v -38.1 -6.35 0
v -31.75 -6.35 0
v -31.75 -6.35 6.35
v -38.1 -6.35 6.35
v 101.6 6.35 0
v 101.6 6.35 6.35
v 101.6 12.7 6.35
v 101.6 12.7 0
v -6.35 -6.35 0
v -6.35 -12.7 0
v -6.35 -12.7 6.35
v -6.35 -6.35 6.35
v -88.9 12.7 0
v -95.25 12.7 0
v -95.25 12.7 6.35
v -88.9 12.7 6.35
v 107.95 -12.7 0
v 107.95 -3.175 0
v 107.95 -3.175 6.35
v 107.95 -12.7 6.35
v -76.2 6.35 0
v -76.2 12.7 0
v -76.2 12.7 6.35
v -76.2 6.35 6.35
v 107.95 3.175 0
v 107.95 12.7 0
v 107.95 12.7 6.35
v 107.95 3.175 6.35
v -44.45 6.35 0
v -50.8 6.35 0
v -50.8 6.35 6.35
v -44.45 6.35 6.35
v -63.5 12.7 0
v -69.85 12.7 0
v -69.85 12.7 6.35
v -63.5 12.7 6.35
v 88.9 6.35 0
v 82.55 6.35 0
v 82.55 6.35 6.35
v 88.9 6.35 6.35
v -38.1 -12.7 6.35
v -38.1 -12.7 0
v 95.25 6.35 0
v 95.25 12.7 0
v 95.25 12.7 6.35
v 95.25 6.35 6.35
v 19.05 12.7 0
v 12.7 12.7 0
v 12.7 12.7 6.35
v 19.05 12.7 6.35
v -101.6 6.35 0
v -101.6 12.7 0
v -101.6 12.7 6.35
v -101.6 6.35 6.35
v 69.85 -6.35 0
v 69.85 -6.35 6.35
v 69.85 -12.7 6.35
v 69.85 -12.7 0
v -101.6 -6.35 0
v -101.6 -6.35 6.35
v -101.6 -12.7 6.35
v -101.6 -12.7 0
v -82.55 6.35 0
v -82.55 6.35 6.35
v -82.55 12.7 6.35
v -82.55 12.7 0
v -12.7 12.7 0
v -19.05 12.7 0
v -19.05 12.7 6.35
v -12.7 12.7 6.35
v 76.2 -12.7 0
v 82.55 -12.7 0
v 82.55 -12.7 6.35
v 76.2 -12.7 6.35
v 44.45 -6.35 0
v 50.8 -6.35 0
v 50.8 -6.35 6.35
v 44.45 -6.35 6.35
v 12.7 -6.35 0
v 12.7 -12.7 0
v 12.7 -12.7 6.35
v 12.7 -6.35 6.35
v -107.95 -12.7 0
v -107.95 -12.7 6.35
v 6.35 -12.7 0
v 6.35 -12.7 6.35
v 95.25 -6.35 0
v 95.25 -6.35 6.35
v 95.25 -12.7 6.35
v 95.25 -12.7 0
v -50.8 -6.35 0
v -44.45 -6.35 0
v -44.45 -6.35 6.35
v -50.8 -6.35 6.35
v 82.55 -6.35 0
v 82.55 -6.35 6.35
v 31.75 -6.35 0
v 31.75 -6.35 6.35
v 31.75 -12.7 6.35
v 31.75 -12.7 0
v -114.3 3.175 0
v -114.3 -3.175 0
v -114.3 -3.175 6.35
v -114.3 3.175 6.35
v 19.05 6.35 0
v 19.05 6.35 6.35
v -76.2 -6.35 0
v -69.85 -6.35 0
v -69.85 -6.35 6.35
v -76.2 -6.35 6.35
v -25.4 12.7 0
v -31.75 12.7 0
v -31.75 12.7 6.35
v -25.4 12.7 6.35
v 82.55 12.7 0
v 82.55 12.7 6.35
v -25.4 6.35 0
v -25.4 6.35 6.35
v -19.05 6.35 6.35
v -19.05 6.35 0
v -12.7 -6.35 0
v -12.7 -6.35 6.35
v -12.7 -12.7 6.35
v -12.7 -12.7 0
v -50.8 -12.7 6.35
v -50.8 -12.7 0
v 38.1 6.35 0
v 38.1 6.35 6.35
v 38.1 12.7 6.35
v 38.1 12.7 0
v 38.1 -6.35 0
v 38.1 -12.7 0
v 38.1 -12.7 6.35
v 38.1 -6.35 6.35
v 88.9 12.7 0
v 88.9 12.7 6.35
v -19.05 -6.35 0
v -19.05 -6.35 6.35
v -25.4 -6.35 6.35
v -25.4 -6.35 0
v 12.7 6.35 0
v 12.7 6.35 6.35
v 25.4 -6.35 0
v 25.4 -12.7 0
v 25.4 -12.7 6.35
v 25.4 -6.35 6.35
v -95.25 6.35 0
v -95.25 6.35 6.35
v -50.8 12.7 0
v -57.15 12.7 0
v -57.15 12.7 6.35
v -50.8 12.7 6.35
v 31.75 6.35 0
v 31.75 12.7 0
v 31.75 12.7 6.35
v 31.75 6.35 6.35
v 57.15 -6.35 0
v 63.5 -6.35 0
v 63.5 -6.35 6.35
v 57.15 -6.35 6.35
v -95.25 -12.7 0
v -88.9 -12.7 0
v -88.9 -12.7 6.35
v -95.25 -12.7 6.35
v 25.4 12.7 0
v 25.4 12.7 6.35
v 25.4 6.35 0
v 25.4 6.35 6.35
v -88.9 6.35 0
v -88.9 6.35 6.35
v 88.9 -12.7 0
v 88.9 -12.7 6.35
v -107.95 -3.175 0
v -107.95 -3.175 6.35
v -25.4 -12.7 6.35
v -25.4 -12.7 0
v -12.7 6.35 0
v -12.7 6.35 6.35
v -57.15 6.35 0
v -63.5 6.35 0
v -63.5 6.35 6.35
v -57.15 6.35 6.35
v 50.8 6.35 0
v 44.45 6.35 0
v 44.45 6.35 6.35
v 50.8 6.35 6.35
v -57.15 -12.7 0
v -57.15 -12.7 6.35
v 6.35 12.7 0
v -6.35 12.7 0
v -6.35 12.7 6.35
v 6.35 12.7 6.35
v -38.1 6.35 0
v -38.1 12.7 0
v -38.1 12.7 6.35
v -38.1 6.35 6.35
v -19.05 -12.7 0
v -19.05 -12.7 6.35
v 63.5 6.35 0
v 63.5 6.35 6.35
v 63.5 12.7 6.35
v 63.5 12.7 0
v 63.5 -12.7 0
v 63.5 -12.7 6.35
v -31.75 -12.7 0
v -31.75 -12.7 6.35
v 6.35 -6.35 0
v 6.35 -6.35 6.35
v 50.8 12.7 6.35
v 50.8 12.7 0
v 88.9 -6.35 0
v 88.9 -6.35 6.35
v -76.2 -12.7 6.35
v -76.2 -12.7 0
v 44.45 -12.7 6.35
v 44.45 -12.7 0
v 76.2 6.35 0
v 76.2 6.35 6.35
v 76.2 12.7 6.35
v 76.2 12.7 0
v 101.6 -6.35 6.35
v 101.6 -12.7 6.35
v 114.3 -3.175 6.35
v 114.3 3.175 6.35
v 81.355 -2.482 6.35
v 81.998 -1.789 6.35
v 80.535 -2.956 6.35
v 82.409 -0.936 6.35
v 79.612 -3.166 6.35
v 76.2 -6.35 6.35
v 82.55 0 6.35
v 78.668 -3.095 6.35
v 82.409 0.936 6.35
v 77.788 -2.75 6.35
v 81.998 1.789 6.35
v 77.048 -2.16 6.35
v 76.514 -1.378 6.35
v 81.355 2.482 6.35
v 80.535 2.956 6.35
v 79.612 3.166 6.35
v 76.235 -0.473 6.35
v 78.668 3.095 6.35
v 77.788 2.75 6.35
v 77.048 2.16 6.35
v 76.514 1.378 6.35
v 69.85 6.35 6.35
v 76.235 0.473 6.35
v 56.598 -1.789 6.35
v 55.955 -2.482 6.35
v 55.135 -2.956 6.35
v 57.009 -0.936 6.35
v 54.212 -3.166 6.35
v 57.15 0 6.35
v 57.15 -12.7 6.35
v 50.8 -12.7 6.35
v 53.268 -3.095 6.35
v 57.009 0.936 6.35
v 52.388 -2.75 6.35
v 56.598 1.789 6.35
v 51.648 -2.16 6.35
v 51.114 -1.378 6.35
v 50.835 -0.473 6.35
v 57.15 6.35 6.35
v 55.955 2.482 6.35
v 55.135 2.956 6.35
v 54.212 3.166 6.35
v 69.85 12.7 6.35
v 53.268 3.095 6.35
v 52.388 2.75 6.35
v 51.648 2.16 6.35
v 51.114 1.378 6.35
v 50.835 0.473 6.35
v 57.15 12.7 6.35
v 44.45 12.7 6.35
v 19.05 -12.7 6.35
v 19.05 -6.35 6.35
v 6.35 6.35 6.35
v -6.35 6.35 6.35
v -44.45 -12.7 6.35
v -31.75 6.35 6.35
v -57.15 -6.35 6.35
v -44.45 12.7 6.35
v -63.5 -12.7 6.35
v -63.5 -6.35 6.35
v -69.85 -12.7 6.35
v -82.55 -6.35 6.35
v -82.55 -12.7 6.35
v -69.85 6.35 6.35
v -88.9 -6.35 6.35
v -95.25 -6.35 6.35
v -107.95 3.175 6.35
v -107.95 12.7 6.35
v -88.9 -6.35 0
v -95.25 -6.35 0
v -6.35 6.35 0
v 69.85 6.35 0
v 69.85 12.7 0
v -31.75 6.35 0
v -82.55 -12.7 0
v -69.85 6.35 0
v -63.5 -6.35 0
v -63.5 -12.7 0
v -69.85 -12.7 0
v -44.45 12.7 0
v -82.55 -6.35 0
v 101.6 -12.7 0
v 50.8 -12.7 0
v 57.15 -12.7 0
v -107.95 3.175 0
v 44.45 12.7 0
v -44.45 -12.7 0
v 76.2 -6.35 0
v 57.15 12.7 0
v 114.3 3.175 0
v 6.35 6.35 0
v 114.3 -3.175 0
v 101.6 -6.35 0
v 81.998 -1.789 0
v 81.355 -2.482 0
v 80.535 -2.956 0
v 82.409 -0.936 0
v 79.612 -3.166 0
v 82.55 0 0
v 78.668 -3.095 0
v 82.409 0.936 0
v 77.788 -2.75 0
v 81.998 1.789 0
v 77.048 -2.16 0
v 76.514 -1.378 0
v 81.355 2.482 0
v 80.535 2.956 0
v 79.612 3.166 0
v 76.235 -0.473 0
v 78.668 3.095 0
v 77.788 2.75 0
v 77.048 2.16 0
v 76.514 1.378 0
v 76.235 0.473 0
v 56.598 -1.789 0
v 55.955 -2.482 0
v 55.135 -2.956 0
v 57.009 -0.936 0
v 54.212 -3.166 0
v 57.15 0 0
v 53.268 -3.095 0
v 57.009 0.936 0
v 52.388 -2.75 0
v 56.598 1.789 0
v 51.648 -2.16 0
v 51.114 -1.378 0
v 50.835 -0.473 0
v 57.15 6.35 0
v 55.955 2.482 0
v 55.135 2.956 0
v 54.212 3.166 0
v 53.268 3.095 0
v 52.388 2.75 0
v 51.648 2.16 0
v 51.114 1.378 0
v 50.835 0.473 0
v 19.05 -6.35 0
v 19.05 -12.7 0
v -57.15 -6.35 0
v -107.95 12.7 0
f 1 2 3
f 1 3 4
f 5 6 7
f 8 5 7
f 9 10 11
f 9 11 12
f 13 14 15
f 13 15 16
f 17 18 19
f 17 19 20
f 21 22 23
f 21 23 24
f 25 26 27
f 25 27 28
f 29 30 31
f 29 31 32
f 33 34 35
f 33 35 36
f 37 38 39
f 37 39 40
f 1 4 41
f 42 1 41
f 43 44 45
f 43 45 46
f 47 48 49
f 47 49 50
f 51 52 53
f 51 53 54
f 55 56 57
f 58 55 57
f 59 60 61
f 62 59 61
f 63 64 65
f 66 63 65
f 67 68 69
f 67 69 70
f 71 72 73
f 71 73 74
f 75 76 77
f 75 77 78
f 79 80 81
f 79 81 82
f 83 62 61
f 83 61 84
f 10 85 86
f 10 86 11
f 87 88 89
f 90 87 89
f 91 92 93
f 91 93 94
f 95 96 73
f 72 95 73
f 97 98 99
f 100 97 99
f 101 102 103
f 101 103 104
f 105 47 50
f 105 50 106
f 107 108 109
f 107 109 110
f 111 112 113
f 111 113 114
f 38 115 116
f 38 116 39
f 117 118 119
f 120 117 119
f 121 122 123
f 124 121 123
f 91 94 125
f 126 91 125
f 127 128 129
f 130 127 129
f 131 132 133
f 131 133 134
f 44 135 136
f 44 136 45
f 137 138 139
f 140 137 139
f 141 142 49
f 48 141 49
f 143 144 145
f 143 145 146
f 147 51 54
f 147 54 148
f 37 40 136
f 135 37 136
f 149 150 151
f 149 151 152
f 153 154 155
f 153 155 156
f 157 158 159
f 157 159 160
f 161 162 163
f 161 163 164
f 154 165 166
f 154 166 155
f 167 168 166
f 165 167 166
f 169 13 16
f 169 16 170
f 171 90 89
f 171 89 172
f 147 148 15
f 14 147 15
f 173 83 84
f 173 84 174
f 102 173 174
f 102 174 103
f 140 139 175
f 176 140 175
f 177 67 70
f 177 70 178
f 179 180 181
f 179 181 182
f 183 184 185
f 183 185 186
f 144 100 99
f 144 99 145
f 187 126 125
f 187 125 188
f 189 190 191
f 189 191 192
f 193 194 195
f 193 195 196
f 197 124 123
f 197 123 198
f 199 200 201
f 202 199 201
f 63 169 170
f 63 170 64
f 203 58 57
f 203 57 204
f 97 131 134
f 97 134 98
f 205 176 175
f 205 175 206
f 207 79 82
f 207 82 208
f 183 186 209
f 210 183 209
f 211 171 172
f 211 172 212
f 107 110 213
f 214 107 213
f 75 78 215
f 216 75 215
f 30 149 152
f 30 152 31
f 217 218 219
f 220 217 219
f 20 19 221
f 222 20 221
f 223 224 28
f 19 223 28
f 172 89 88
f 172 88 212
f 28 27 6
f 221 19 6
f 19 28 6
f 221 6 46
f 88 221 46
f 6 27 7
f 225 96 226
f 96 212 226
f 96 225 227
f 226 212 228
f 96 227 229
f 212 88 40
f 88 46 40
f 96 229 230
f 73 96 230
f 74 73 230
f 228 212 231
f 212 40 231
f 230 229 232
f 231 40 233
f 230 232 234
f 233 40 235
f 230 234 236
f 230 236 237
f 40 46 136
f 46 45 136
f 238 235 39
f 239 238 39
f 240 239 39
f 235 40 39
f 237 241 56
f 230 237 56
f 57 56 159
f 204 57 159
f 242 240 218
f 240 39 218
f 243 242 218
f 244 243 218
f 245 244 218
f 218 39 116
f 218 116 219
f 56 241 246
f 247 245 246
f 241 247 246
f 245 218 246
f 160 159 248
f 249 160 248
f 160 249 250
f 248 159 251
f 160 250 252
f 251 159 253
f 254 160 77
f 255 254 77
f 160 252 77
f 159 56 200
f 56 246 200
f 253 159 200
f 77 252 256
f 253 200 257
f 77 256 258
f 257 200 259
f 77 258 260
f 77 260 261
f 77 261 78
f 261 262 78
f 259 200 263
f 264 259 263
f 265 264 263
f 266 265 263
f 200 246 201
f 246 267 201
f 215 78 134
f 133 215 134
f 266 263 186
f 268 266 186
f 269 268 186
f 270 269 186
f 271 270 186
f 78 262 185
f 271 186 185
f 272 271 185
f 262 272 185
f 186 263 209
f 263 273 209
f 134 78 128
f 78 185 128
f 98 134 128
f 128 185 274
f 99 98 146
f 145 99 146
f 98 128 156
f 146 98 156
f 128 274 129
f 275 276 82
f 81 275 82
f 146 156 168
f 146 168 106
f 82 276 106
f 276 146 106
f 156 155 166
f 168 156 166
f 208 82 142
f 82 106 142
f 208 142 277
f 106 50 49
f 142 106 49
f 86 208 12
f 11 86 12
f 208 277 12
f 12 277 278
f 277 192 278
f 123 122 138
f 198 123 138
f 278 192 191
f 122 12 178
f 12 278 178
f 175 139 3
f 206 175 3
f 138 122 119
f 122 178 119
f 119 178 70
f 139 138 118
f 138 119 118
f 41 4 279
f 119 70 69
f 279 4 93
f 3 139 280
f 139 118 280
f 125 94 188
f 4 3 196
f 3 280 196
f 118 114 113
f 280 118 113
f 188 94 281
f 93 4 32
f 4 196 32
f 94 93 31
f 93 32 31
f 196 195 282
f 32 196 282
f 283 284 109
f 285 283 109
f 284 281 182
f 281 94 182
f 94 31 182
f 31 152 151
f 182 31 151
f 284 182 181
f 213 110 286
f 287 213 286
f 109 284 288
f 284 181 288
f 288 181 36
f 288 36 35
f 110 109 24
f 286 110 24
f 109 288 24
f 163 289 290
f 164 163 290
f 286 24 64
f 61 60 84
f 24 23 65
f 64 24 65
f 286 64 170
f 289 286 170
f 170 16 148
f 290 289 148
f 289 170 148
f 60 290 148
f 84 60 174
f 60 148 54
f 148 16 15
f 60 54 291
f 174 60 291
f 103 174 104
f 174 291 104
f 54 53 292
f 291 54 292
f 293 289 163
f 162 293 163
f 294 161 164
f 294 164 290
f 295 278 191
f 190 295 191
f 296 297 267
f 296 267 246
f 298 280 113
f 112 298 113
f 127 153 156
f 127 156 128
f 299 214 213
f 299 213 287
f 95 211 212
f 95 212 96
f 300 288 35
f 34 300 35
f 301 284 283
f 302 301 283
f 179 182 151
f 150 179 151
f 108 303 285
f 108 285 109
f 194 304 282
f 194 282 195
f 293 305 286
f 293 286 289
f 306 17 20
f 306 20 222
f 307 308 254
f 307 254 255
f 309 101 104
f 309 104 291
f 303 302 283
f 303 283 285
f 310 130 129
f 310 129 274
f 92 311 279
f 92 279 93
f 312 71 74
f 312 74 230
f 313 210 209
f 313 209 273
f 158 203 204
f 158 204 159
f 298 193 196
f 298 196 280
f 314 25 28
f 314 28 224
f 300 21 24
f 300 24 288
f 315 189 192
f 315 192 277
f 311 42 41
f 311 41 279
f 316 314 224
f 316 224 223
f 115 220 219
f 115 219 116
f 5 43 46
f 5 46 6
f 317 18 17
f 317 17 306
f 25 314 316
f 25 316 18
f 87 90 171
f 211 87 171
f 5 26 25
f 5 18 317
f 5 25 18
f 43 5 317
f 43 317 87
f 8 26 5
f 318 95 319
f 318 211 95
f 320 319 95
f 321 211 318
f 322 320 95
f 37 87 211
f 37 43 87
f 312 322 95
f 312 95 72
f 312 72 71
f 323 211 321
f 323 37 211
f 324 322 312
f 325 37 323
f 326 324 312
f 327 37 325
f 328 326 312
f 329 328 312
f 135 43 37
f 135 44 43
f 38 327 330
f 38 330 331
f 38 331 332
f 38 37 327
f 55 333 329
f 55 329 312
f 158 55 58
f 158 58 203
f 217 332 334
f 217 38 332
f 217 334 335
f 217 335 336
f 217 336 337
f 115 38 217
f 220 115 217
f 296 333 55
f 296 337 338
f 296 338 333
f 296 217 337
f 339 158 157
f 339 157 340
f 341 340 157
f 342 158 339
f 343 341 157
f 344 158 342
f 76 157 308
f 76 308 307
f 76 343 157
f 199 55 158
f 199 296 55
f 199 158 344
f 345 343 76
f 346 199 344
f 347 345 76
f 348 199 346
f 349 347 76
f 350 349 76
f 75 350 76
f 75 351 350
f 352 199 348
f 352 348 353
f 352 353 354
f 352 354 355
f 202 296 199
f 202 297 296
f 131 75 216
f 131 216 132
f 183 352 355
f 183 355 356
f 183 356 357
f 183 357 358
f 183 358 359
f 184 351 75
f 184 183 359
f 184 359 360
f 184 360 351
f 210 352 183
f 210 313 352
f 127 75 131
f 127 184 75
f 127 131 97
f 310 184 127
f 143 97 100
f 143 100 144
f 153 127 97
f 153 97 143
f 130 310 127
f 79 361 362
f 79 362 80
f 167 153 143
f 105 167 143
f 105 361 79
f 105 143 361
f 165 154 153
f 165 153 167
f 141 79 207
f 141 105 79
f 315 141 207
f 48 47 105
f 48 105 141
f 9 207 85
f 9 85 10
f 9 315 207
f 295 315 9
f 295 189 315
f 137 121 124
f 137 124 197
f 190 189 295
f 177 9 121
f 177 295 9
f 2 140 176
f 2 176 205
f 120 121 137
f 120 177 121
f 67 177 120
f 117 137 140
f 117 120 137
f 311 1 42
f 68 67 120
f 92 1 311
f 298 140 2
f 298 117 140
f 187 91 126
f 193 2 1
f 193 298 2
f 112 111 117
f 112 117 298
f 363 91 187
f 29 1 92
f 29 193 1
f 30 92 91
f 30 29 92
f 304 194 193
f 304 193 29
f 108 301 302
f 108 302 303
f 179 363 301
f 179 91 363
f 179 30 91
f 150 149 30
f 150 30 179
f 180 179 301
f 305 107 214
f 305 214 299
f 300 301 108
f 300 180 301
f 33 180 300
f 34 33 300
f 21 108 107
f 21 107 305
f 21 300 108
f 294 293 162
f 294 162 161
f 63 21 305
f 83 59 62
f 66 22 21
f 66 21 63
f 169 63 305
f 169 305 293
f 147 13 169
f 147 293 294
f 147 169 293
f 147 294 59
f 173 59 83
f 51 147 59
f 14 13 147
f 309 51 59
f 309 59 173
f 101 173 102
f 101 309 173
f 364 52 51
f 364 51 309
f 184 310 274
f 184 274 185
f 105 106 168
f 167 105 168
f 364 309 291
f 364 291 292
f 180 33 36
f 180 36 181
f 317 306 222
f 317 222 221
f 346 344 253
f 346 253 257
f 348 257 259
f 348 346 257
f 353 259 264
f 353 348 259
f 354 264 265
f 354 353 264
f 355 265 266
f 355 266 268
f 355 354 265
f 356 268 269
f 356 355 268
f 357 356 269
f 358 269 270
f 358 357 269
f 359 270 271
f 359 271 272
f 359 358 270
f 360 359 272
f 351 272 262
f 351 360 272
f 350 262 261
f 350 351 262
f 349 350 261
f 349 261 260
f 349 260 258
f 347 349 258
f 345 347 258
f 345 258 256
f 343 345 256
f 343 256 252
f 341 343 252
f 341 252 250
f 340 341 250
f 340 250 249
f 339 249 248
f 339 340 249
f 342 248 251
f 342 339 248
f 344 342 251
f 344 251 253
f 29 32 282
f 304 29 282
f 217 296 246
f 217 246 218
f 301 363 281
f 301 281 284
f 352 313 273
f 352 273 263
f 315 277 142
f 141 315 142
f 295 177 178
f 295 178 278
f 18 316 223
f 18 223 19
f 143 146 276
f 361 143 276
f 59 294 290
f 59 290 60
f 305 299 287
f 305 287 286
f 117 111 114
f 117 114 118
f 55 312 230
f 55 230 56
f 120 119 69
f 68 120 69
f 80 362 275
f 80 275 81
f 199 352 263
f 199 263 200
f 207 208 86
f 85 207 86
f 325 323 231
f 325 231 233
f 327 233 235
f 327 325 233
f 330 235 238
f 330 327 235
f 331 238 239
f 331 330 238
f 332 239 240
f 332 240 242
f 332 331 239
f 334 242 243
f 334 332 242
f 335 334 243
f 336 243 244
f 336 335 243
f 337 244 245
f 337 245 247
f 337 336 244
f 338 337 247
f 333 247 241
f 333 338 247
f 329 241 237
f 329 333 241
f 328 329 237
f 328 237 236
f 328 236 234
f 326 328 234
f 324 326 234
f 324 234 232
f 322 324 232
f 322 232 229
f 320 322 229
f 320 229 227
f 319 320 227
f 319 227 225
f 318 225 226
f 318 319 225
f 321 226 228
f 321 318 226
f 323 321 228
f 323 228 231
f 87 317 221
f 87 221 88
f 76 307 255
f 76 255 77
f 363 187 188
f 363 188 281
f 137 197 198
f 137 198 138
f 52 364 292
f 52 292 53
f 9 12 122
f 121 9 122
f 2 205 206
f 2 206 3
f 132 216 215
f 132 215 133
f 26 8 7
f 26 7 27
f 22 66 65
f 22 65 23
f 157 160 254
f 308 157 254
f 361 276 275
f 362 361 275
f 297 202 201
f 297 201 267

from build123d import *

# Parameters (mm, degrees)
SKETCH2_R           = 3.175
BOSS_EXTRUDE1_DEPTH = 6.35


with BuildPart() as part:
    # Sketch2 → Boss-Extrude1 (new body)
    with BuildSketch(Plane.XY):
        Polygon((-101.6, 12.7), (-107.95, 12.7), (-107.95, 3.175), (-114.3, 3.175), (-114.3, -3.175), (-107.95, -3.175), (-107.95, -12.7), (-101.6, -12.7), (-101.6, -6.35), (-95.25, -6.35), (-95.25, -12.7), (-88.9, -12.7), (-88.9, -6.35), (-82.55, -6.35), (-82.55, -12.7), (-76.2, -12.7), (-76.2, -6.35), (-69.85, -6.35), (-69.85, -12.7), (-63.5, -12.7), (-63.5, -6.35), (-57.15, -6.35), (-57.15, -12.7), (-50.8, -12.7), (-50.8, -6.35), (-44.45, -6.35), (-44.45, -12.7), (-38.1, -12.7), (-38.1, -6.35), (-31.75, -6.35), (-31.75, -12.7), (-25.4, -12.7), (-25.4, -6.35), (-19.05, -6.35), (-19.05, -12.7), (-12.7, -12.7), (-12.7, -6.35), (-6.35, -6.35), (-6.35, -12.7), (6.35, -12.7), (6.35, -6.35), (12.7, -6.35), (12.7, -12.7), (19.05, -12.7), (19.05, -6.35), (25.4, -6.35), (25.4, -12.7), (31.75, -12.7), (31.75, -6.35), (38.1, -6.35), (38.1, -12.7), (44.45, -12.7), (44.45, -6.35), (50.8, -6.35), (50.8, -12.7), (57.15, -12.7), (57.15, -6.35), (63.5, -6.35), (63.5, -12.7), (69.85, -12.7), (69.85, -6.35), (76.2, -6.35), (76.2, -12.7), (82.55, -12.7), (82.55, -6.35), (88.9, -6.35), (88.9, -12.7), (95.25, -12.7), (95.25, -6.35), (101.6, -6.35), (101.6, -12.7), (107.95, -12.7), (107.95, -3.175), (114.3, -3.175), (114.3, 3.175), (107.95, 3.175), (107.95, 12.7), (101.6, 12.7), (101.6, 6.35), (95.25, 6.35), (95.25, 12.7), (88.9, 12.7), (88.9, 6.35), (82.55, 6.35), (82.55, 12.7), (76.2, 12.7), (76.2, 6.35), (69.85, 6.35), (69.85, 12.7), (63.5, 12.7), (63.5, 6.35), (57.15, 6.35), (57.15, 12.7), (50.8, 12.7), (50.8, 6.35), (44.45, 6.35), (44.45, 12.7), (38.1, 12.7), (38.1, 6.35), (31.75, 6.35), (31.75, 12.7), (25.4, 12.7), (25.4, 6.35), (19.05, 6.35), (19.05, 12.7), (12.7, 12.7), (12.7, 6.35), (6.35, 6.35), (6.35, 12.7), (-6.35, 12.7), (-6.35, 6.35), (-12.7, 6.35), (-12.7, 12.7), (-19.05, 12.7), (-19.05, 6.35), (-25.4, 6.35), (-25.4, 12.7), (-31.75, 12.7), (-31.75, 6.35), (-38.1, 6.35), (-38.1, 12.7), (-44.45, 12.7), (-44.45, 6.35), (-50.8, 6.35), (-50.8, 12.7), (-57.15, 12.7), (-57.15, 6.35), (-63.5, 6.35), (-63.5, 12.7), (-69.85, 12.7), (-69.85, 6.35), (-76.2, 6.35), (-76.2, 12.7), (-82.55, 12.7), (-82.55, 6.35), (-88.9, 6.35), (-88.9, 12.7), (-95.25, 12.7), (-95.25, 6.35), (-101.6, 6.35), align=None)
        with Locations((53.975, 0)):
            Circle(SKETCH2_R, mode=Mode.SUBTRACT)
        with Locations((79.375, 0)):
            Circle(SKETCH2_R, mode=Mode.SUBTRACT)
    extrude(amount=BOSS_EXTRUDE1_DEPTH)


solid = part.part
